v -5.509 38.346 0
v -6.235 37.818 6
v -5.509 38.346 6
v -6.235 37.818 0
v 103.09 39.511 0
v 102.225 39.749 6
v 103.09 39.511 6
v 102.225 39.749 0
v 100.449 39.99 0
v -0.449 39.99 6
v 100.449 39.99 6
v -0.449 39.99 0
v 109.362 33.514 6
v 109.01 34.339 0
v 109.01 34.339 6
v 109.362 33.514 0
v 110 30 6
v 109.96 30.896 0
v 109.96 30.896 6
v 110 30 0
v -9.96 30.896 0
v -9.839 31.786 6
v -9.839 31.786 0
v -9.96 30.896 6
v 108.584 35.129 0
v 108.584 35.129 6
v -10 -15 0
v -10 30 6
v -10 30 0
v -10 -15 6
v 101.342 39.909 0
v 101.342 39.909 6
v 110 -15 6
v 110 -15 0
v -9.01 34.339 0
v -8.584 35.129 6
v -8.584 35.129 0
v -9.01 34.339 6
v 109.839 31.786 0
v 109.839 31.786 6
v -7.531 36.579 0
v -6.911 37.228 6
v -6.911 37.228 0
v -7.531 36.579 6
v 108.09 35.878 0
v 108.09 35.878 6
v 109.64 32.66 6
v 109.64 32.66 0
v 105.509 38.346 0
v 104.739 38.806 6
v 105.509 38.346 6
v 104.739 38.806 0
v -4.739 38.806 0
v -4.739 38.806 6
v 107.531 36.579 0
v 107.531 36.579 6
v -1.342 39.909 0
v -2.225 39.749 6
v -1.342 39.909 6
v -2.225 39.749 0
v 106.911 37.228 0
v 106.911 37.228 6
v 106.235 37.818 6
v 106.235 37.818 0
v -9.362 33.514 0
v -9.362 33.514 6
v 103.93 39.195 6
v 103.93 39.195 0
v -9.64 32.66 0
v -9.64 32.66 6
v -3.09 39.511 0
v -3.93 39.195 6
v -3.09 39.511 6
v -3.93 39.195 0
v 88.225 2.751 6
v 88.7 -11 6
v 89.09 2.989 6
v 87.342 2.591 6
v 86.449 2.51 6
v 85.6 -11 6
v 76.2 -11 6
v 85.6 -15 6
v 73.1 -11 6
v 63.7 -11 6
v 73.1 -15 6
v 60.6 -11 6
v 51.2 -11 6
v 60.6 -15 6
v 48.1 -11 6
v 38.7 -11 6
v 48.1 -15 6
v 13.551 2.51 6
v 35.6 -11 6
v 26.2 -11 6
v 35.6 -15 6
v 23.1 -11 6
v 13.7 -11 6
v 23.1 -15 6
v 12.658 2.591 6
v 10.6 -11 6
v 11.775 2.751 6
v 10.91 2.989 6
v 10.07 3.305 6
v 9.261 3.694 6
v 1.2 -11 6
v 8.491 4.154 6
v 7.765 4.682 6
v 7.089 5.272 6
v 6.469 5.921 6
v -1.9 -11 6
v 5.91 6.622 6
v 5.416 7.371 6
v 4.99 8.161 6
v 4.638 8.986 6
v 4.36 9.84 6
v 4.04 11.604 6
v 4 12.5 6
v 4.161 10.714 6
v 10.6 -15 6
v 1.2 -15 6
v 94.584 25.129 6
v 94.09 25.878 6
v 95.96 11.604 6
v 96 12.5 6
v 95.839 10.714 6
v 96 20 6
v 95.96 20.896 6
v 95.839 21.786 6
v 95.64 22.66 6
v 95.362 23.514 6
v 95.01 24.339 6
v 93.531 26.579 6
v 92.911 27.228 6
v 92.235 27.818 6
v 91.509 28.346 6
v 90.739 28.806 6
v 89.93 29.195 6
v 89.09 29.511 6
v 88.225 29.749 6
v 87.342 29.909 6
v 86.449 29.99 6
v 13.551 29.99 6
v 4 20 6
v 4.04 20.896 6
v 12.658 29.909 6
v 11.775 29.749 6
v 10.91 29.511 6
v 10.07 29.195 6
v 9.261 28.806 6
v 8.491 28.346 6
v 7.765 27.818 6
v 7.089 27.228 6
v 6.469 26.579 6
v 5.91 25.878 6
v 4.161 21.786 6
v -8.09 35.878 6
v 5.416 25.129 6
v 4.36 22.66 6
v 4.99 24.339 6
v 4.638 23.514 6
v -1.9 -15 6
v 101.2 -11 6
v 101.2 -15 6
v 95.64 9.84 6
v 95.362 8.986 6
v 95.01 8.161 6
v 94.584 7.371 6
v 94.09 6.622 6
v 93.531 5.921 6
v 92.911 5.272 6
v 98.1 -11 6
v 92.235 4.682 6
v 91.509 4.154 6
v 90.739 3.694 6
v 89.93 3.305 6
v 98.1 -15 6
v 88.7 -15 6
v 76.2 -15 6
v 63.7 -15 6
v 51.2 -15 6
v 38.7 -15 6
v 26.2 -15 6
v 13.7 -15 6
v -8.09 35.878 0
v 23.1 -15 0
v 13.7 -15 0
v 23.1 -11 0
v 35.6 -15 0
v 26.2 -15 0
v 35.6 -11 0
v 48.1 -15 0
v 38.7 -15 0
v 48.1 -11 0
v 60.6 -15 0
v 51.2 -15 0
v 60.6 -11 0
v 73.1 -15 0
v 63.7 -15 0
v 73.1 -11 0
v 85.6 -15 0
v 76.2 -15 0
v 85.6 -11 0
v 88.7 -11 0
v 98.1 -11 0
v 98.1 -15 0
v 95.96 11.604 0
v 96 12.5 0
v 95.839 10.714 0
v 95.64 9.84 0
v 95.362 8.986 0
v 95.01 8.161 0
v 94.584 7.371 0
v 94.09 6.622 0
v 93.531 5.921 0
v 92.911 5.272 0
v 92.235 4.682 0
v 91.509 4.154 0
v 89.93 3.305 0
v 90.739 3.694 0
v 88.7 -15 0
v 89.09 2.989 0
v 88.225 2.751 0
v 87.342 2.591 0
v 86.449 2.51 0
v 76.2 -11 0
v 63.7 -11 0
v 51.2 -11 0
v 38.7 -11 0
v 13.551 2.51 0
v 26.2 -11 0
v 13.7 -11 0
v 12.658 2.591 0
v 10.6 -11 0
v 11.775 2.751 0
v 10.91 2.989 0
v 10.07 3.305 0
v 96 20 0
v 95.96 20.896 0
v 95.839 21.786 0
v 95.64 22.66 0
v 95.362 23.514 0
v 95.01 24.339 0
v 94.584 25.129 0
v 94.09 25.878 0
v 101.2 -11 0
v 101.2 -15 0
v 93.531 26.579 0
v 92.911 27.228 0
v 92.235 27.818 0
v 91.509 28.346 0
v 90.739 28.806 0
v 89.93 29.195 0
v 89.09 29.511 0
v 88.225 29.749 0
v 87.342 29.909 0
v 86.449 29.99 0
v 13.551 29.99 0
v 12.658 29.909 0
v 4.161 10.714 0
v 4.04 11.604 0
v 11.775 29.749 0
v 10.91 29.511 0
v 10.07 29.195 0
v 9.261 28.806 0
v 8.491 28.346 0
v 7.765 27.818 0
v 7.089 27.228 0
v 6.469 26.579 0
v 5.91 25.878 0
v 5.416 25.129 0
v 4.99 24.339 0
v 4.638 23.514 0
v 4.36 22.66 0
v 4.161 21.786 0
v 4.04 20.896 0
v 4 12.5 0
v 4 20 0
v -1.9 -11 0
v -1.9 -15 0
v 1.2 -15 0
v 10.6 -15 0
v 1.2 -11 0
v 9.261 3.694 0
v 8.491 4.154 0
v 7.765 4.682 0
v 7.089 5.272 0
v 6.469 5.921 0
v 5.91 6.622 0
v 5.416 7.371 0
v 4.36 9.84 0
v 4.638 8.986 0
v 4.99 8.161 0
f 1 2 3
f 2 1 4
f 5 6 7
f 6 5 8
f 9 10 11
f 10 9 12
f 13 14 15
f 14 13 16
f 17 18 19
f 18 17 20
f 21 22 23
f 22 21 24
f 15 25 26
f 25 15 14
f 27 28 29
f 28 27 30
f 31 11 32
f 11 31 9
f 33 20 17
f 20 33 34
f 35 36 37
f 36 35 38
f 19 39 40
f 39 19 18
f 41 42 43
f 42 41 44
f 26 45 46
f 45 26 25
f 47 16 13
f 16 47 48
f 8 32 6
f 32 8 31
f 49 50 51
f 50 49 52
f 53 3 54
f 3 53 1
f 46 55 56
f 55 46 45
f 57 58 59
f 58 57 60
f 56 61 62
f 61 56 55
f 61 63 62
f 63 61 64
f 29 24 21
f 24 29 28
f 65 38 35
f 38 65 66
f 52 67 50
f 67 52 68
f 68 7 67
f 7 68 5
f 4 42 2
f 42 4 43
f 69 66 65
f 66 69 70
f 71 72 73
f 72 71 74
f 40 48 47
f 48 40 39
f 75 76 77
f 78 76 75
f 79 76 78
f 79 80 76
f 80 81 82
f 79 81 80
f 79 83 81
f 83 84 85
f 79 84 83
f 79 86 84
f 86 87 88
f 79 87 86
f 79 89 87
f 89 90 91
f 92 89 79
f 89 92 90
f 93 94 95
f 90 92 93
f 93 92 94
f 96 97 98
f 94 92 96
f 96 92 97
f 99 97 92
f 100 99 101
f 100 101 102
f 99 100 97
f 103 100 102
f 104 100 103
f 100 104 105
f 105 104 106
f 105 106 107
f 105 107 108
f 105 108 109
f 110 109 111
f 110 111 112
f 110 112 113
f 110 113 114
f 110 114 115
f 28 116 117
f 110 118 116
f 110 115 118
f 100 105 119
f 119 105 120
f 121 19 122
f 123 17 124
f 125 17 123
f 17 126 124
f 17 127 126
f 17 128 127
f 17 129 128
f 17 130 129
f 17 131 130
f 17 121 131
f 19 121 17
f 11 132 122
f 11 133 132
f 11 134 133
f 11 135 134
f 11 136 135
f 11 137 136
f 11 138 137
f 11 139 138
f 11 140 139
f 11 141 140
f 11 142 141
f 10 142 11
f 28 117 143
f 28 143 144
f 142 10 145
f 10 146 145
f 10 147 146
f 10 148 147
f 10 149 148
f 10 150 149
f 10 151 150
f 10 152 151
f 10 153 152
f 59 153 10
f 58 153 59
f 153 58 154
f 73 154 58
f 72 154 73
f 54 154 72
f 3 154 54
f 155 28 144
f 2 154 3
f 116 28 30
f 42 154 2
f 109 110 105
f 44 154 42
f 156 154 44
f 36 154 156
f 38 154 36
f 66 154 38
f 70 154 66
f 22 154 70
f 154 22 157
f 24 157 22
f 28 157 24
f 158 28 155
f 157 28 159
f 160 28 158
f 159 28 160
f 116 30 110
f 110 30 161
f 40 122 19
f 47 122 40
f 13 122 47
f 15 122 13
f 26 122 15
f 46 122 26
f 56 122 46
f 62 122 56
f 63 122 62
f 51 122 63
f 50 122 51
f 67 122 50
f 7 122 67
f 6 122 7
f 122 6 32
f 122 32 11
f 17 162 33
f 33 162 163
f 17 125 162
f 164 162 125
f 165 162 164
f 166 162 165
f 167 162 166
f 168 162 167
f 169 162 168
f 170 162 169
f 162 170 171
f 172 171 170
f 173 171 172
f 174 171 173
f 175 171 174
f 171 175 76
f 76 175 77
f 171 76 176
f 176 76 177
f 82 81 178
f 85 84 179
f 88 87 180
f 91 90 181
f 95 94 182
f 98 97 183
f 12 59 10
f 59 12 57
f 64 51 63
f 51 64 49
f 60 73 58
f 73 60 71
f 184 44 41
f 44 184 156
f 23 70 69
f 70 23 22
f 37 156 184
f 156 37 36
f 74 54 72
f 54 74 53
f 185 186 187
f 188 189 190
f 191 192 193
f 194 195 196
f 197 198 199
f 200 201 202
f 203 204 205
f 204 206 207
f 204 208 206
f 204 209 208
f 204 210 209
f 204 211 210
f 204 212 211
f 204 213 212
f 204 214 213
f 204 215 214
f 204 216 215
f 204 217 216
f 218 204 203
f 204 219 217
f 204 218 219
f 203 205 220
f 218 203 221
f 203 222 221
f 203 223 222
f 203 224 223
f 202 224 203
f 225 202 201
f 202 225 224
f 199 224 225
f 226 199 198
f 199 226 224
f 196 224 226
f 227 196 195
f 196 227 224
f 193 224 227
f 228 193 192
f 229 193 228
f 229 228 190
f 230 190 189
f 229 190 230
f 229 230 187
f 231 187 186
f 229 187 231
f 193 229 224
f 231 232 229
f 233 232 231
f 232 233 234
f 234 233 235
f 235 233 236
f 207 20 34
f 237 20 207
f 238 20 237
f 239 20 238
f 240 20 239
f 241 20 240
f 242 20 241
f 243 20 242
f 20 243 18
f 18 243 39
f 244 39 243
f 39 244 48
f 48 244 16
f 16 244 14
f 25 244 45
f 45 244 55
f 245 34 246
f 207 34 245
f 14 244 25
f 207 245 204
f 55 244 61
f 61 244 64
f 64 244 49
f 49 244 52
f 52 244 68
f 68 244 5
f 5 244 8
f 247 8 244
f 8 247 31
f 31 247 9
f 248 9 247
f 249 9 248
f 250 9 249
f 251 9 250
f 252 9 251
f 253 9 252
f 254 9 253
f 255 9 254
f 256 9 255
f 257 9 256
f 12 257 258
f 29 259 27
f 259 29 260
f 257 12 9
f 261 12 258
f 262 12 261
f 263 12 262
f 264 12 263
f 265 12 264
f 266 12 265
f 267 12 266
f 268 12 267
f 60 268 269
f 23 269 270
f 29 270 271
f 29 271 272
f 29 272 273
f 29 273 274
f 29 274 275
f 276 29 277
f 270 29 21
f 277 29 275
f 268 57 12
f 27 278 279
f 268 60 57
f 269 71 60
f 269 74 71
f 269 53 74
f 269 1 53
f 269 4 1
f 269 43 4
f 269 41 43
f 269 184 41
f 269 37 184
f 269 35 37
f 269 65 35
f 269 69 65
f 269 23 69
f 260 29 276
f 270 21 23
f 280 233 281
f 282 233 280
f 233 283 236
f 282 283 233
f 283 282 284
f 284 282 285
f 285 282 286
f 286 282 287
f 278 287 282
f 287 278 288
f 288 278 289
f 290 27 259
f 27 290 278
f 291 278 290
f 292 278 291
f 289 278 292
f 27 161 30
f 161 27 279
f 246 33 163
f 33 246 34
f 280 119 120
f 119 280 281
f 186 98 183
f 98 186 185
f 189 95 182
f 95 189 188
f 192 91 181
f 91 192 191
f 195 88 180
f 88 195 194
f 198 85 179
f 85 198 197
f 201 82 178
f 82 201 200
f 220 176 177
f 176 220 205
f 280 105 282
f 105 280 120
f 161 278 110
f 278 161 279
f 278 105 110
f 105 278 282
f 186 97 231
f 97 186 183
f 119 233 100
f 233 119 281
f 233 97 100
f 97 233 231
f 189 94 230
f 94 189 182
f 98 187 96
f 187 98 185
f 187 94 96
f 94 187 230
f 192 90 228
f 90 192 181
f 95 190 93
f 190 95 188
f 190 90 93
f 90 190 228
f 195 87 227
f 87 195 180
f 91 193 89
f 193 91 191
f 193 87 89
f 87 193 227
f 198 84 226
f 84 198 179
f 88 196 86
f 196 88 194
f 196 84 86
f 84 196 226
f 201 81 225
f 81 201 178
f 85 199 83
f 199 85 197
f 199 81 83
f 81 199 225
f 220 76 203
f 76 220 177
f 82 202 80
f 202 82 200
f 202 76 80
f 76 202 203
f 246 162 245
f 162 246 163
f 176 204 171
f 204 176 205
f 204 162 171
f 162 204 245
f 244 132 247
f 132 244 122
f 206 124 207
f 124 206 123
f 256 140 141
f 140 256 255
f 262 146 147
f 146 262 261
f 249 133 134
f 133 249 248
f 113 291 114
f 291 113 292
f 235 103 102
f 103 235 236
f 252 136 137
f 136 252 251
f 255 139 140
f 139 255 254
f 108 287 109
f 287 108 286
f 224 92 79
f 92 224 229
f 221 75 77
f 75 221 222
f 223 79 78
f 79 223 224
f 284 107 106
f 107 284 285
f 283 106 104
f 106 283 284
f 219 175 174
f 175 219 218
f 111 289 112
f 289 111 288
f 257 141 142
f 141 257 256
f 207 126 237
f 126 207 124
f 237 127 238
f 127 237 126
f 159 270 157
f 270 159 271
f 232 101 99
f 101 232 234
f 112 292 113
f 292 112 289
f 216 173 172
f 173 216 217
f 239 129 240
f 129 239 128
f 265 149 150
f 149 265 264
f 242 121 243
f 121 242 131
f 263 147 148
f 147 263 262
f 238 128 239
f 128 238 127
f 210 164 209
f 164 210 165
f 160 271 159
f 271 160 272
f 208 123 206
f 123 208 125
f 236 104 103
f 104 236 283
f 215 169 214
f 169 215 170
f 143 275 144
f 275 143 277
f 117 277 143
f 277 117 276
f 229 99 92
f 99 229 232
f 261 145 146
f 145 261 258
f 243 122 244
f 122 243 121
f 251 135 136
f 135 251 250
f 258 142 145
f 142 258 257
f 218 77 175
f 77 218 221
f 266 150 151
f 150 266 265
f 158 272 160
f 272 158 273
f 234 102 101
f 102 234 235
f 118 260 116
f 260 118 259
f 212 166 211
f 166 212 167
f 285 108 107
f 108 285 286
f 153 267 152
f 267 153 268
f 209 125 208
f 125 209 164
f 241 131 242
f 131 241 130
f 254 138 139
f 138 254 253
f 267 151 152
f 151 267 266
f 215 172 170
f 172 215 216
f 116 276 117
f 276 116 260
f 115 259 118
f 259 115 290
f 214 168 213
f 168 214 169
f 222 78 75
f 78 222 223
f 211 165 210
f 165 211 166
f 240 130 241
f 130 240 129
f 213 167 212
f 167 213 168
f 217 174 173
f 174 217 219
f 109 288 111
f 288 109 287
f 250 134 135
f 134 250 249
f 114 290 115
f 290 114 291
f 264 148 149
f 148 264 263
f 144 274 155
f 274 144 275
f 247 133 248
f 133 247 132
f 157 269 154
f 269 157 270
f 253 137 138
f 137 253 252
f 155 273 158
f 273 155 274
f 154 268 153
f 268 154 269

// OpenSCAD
/*
PetCageCleaner
Copyright (C) 2014  Benjamin Hirmer - hardy at virtoreal.net

This program is free software: you can redistribute it and/or modify
it under the terms of the GNU General Public License as published by
the Free Software Foundation, either version 3 of the License, or
(at your option) any later version.

This program is distributed in the hope that it will be useful,
but WITHOUT ANY WARRANTY; without even the implied warranty of
MERCHANTABILITY or FITNESS FOR A PARTICULAR PURPOSE.  See the
GNU General Public License for more details.

You should have received a copy of the GNU General Public License
along with this program.  If not, see <http://www.gnu.org/licenses/>.
*/

//Softening the Edges of your Tool
edgeround = 10; // [0:15]
//Adjust the Width of your Tool (6 would be strong enough)
toolwidth = 6; 
//Type in the Lenght of your Tool, the Longer the Easy to Clean!
toollenght = 120; 
//Resize the Handle
handlysize = 30; 
//Rezize the Hole in the Handle
handlyhole = 5; 
//Whats the Distance between the Rods of your Cage? (center to center of rod)
latticerodsdistance = 12.5; 
//Define the Size of the Gaps, remember: the Rod and your Cloth have to fit in
gapsize = 3.1;
//Define the Depth of the Gaps (dont make them to deep, your cloth will tear apart)
gapdepth = 5; 
//The End of the Gap depends on your Tool-Lenght/Gap-Size, rearrange for a nicer Look
rearrangegap = 5; 
//Resolution of your Tool (70 would be fine enough)
$fn = 70;

difference () {

  union () {
    minkowski() {
      cube([toollenght-edgeround*2,handlysize,toolwidth-1]);
      cylinder(r=edgeround,h=1);
    }
    translate ([-edgeround,-edgeround-gapdepth,0]) cube (size = [toollenght,edgeround+gapdepth,toolwidth]);
  }
  union () {
    translate ([-edgeround+toollenght/5,handlysize/2-handlyhole/2,-1]) {
      minkowski() {
	cube([toollenght/5*3,edgeround/4+handlyhole,toolwidth+1]);
	cylinder(r=edgeround,h=1);
      }
    }
      translate ([-edgeround+gapsize+rearrangegap,-edgeround-gapdepth,-1]) {
	for ( i = [0 : latticerodsdistance : toollenght] )
	{
	    translate([i, -1, 0])
	    cube (size = [gapsize,gapdepth,toolwidth+2]);
	}
      }
  
  
  }
}
